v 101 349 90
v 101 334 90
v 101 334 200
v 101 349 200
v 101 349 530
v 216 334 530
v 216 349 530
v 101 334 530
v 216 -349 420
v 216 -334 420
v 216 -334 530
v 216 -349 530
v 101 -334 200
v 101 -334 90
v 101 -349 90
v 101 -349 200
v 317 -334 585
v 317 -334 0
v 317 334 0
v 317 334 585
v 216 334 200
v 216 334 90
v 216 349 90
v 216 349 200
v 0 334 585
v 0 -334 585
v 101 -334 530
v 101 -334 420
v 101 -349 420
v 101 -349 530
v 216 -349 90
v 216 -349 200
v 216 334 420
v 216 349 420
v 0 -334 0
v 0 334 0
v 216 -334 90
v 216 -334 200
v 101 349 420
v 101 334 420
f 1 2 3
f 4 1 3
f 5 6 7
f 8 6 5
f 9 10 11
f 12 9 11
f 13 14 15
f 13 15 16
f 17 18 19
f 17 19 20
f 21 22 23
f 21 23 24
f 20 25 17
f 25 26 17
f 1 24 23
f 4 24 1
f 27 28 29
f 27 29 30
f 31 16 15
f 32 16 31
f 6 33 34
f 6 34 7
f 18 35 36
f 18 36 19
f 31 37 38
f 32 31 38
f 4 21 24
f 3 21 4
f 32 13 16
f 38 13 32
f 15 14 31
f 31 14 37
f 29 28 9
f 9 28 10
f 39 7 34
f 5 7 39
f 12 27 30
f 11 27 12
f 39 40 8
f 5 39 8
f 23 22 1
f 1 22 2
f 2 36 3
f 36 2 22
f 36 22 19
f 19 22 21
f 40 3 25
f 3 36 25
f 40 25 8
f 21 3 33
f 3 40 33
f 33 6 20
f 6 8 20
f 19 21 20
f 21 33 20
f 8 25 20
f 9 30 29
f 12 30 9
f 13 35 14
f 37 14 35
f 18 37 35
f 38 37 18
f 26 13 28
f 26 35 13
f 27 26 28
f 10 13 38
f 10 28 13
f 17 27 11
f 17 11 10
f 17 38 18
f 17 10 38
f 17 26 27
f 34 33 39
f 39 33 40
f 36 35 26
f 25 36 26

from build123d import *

# Parameters (mm, degrees)
F0_W     = 317
F0_H     = 585
F1_DEPTH = 334
F2_W     = 115
F2_H     = 110
F3_DEPTH = 15
F4_W     = 115
F4_H     = 110
F5_DEPTH = 15


with BuildPart() as f1:
    # F0 (on Front) → F1 (new body, symmetric)
    with BuildSketch(Plane.XZ):
        with Locations((158.5, 292.5)):
            Rectangle(F0_W, F0_H)
    extrude(amount=F1_DEPTH, both=True)

    # F2 (on face) → F3 (join)
    with BuildSketch(Plane.XZ.offset(334)):
        with Locations((158.5, 475)):
            Rectangle(F2_W, F2_H)
        with Locations((158.5, 145)):
            Rectangle(F2_W, F2_H)
    extrude(amount=F3_DEPTH)

    # F4 (on face) → F5 (join)
    with BuildSketch(Plane(origin=(0, 334, 0), x_dir=(-1, 0, 0), z_dir=(0, 1, 0))):
        with Locations((-158.5, 475)):
            Rectangle(F4_W, F4_H)
        with Locations((-158.5, 145)):
            Rectangle(F4_W, F4_H)
    extrude(amount=F5_DEPTH)


solid = f1.part
